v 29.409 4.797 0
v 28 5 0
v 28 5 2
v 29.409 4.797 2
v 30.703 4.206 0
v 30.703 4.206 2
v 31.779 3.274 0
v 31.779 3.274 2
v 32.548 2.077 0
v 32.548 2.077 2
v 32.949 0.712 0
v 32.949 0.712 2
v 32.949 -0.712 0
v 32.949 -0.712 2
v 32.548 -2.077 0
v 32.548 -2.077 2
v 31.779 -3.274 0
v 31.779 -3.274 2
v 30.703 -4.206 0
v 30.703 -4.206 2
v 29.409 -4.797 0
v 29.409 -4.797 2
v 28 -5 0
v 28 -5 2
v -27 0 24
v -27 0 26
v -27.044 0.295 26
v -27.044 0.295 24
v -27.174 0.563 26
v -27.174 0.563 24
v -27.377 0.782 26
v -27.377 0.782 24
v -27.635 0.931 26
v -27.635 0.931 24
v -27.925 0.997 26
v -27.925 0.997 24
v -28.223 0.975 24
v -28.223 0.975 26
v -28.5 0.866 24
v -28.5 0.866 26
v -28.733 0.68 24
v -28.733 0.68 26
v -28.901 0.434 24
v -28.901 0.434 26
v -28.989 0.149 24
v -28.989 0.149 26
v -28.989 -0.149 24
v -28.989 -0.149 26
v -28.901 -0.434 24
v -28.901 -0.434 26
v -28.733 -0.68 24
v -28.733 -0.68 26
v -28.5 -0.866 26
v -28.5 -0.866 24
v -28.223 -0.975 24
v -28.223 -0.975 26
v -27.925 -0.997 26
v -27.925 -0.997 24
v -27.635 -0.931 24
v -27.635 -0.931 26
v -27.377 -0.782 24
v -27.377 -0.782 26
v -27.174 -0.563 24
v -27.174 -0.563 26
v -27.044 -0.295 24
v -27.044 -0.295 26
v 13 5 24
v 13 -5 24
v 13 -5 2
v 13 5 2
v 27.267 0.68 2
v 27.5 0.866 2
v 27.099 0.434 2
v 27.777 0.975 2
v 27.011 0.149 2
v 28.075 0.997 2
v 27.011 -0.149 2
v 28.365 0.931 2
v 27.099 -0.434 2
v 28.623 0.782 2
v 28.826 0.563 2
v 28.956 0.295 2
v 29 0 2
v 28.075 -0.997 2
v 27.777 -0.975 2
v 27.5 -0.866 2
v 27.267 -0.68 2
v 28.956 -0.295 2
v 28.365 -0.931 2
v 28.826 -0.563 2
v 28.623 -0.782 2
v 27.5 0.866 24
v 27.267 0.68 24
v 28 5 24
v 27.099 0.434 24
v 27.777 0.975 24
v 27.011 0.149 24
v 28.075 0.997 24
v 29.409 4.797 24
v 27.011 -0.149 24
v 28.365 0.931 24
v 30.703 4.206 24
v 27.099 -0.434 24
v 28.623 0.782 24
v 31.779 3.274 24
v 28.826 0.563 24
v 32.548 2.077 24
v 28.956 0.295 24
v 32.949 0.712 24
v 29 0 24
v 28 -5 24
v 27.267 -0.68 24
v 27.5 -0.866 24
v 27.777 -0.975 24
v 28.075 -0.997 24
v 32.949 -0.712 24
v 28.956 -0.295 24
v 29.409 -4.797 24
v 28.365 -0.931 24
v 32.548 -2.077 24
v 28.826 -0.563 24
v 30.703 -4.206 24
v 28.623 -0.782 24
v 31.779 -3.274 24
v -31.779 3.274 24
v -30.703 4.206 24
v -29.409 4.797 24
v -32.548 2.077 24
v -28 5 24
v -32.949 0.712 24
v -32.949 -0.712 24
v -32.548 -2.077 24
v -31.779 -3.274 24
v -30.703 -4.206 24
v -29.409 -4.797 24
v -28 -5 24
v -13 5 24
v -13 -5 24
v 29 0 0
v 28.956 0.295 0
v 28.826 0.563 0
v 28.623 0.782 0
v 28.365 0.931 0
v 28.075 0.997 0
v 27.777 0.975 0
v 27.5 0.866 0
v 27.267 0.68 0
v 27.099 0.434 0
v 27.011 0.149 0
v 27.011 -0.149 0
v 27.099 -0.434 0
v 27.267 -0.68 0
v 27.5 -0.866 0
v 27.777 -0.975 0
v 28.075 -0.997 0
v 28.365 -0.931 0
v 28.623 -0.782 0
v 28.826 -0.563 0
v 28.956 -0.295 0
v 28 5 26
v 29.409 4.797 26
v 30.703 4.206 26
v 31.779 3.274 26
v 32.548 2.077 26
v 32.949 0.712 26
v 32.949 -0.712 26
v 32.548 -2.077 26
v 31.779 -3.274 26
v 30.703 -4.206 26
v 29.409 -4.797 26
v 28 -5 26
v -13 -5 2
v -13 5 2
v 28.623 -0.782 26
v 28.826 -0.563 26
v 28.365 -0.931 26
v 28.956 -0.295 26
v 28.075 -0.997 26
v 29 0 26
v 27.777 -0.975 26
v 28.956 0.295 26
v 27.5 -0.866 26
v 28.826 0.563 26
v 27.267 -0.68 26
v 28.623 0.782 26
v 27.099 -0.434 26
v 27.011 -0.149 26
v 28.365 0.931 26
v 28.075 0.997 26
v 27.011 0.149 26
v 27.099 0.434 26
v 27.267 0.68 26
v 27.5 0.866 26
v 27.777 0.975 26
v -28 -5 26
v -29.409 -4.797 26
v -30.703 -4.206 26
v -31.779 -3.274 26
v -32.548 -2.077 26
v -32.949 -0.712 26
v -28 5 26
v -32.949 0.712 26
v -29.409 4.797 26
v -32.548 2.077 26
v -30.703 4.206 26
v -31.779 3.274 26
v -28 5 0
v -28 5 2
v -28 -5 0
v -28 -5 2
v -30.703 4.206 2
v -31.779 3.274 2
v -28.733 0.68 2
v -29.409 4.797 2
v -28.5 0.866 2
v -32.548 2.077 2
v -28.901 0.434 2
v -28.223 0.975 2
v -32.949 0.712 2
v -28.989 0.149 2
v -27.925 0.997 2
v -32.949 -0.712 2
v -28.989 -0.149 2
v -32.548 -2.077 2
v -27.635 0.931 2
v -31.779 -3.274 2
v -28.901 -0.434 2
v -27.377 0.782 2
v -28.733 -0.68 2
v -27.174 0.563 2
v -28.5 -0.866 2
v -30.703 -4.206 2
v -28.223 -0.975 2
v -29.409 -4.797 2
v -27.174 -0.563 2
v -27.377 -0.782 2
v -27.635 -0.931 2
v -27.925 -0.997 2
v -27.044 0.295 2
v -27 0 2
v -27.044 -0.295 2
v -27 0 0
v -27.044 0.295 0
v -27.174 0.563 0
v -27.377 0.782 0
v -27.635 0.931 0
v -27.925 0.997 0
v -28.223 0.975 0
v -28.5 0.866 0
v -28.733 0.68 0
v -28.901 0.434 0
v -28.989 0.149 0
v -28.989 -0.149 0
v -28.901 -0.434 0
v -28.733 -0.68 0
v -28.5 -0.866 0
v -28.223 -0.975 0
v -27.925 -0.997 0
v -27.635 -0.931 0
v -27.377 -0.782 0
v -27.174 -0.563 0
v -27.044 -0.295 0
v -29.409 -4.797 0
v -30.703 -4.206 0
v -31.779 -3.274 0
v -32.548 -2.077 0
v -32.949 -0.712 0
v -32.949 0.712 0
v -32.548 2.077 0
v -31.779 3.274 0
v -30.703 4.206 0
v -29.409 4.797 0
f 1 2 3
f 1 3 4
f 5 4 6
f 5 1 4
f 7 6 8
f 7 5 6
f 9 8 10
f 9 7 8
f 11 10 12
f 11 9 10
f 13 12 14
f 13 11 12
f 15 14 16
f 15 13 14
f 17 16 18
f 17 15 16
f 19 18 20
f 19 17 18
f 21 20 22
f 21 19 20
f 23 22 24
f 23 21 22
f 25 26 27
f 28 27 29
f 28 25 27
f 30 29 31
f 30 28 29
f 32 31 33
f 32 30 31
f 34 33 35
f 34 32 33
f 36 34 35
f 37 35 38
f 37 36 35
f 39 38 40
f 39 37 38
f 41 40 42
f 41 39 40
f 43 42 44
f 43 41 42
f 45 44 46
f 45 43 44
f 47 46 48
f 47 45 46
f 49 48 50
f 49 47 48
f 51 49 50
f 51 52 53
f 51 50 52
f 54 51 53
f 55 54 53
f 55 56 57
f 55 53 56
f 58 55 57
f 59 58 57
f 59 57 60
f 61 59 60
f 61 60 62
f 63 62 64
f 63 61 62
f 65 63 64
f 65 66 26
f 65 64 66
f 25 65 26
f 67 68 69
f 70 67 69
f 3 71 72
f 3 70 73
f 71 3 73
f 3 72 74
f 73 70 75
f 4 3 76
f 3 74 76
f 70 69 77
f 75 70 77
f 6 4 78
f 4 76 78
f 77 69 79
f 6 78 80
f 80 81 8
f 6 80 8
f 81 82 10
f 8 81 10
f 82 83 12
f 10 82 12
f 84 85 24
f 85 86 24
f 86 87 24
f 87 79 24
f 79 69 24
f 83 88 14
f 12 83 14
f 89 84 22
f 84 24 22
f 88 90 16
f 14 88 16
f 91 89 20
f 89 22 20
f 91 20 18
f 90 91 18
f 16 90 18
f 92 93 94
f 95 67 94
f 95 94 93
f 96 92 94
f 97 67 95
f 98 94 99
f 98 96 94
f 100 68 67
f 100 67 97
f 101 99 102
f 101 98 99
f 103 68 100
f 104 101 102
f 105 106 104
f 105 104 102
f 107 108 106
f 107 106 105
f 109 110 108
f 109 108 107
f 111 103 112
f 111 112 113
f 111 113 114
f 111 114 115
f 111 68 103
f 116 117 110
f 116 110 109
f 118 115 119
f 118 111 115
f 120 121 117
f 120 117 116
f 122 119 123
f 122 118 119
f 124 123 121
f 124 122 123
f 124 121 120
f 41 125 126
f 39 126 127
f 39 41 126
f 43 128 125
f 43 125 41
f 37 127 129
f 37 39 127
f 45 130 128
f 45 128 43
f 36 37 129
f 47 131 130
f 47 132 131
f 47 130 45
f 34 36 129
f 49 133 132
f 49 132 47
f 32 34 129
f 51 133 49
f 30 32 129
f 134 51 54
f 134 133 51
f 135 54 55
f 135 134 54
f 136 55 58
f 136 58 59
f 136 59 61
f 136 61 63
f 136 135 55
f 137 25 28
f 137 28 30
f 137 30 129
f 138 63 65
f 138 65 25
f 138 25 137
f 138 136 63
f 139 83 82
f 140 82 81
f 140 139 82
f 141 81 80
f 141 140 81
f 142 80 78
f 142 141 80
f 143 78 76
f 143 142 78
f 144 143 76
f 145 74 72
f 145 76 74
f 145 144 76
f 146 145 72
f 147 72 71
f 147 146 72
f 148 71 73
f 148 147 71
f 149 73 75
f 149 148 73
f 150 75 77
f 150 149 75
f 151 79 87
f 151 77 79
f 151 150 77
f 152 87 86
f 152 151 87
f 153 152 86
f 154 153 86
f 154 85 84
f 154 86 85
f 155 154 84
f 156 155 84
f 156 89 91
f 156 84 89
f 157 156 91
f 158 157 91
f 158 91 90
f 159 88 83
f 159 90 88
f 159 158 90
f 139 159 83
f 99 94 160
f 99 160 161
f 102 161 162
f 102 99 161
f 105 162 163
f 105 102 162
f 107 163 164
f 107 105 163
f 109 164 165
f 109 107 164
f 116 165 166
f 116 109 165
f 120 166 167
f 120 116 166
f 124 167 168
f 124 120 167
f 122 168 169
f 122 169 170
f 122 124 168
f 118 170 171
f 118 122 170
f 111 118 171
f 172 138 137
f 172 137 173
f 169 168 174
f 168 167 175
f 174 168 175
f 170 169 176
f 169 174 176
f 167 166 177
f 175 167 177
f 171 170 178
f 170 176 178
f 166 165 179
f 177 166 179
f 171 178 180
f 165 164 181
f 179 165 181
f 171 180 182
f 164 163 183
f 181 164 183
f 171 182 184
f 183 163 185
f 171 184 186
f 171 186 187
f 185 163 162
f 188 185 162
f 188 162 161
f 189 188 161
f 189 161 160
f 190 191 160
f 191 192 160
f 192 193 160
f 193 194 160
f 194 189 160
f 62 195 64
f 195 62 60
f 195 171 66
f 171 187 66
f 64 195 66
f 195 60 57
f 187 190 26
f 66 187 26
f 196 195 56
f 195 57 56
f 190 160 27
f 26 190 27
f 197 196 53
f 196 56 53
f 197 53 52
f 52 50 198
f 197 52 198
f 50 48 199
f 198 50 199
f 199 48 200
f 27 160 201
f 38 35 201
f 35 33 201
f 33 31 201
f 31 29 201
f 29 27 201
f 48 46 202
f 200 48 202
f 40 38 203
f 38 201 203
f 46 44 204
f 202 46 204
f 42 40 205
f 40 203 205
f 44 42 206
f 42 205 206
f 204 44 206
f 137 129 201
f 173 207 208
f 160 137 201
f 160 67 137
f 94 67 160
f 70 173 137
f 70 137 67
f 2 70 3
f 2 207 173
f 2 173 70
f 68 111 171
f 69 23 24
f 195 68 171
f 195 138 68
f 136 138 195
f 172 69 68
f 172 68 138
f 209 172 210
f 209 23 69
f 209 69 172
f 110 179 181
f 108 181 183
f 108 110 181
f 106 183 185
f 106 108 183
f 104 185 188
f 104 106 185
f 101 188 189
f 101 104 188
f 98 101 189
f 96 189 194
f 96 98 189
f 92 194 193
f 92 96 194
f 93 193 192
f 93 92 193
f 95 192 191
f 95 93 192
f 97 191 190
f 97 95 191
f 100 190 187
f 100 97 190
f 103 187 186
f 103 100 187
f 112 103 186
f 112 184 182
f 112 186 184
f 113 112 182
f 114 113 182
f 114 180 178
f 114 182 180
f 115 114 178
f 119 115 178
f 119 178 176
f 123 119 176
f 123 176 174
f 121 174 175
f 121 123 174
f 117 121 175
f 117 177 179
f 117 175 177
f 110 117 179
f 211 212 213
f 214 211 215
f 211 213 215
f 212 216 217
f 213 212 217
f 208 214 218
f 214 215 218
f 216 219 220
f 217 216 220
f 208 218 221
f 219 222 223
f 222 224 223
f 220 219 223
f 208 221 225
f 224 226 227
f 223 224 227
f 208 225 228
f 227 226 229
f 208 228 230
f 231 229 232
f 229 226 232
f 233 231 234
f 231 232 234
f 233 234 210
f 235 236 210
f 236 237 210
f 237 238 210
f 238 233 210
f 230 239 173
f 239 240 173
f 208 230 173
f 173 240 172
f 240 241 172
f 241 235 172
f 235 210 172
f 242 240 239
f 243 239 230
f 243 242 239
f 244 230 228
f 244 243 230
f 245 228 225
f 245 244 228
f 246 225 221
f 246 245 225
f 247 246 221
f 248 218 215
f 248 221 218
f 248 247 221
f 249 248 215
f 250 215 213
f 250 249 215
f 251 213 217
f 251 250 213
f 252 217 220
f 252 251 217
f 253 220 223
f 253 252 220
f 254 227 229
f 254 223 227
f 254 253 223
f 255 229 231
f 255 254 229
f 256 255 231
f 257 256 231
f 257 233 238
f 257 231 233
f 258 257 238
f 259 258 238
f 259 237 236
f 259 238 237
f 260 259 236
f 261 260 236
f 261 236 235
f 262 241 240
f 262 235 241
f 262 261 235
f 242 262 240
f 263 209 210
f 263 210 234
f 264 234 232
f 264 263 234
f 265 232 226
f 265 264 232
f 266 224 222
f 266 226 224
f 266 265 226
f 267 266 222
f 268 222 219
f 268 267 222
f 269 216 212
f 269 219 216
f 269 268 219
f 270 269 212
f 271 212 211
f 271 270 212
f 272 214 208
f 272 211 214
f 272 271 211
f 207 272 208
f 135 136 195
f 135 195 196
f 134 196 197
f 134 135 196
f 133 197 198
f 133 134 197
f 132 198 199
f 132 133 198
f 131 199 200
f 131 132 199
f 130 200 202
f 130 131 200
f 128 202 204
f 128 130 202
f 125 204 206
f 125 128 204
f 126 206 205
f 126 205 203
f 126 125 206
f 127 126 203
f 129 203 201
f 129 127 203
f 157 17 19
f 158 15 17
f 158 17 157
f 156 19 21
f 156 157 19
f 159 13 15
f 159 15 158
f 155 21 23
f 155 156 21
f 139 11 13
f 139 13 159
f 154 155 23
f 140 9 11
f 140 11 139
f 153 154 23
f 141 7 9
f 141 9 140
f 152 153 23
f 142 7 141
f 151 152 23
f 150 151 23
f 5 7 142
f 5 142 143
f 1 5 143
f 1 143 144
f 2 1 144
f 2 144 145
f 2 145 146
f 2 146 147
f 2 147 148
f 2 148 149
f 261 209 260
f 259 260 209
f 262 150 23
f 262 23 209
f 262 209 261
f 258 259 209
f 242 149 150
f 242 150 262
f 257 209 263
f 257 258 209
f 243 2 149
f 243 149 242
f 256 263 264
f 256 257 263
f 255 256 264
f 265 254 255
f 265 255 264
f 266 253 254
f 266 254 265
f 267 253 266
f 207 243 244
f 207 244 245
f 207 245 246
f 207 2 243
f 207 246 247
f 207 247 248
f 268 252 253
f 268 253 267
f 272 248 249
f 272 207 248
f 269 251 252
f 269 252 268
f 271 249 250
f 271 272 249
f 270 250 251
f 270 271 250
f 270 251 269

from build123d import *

# Parameters (mm, degrees)
EXTRUDE_1_DEPTH          = 26
SKETCH_2_R               = 1
CUT_EXTRUDE_4_DEPTH      = 27
CUT_EXTRUDE_4_DEPTH_BACK = 30
SKETCH_3_W               = 20
SKETCH_3_H               = 22
CUT_EXTRUDE_5_DEPTH      = 30
CUT_EXTRUDE_5_DEPTH_BACK = 30


with BuildPart() as part:
    # 草圖1 → 填料-伸長1 (new body)
    with BuildSketch(Plane.XY):
        with BuildLine():
            Line((-28, 5), (28, 5))
            ThreePointArc((28, 5), (33, 0), (28, -5))
            Line((28, -5), (-28, -5))
            ThreePointArc((-28, -5), (-33, 0), (-28, 5))
        make_face()
    extrude(amount=EXTRUDE_1_DEPTH)

    # 草圖2 → 除料-伸長4 (cut, two sides)
    with BuildSketch(Plane.XY) as cut_extrude_4_sk:
        with Locations((-28, 0)):
            Circle(SKETCH_2_R)
        with Locations((28, 0)):
            Circle(SKETCH_2_R)
    extrude(amount=CUT_EXTRUDE_4_DEPTH, mode=Mode.SUBTRACT)
    extrude(cut_extrude_4_sk.sketch, amount=-CUT_EXTRUDE_4_DEPTH_BACK, mode=Mode.SUBTRACT)

    # 草圖3 → 除料-伸長5 (cut, two sides)
    with BuildSketch(Plane(origin=(0, 0, 0), x_dir=(1, 0, 0), z_dir=(0, 1, 0))) as cut_extrude_5_sk:
        with Locations((-23, -13)):
            Rectangle(SKETCH_3_W, SKETCH_3_H)
        with Locations((23, -13)):
            Rectangle(SKETCH_3_W, SKETCH_3_H)
    extrude(amount=CUT_EXTRUDE_5_DEPTH, mode=Mode.SUBTRACT)
    extrude(cut_extrude_5_sk.sketch, amount=-CUT_EXTRUDE_5_DEPTH_BACK, mode=Mode.SUBTRACT)


solid = part.part
